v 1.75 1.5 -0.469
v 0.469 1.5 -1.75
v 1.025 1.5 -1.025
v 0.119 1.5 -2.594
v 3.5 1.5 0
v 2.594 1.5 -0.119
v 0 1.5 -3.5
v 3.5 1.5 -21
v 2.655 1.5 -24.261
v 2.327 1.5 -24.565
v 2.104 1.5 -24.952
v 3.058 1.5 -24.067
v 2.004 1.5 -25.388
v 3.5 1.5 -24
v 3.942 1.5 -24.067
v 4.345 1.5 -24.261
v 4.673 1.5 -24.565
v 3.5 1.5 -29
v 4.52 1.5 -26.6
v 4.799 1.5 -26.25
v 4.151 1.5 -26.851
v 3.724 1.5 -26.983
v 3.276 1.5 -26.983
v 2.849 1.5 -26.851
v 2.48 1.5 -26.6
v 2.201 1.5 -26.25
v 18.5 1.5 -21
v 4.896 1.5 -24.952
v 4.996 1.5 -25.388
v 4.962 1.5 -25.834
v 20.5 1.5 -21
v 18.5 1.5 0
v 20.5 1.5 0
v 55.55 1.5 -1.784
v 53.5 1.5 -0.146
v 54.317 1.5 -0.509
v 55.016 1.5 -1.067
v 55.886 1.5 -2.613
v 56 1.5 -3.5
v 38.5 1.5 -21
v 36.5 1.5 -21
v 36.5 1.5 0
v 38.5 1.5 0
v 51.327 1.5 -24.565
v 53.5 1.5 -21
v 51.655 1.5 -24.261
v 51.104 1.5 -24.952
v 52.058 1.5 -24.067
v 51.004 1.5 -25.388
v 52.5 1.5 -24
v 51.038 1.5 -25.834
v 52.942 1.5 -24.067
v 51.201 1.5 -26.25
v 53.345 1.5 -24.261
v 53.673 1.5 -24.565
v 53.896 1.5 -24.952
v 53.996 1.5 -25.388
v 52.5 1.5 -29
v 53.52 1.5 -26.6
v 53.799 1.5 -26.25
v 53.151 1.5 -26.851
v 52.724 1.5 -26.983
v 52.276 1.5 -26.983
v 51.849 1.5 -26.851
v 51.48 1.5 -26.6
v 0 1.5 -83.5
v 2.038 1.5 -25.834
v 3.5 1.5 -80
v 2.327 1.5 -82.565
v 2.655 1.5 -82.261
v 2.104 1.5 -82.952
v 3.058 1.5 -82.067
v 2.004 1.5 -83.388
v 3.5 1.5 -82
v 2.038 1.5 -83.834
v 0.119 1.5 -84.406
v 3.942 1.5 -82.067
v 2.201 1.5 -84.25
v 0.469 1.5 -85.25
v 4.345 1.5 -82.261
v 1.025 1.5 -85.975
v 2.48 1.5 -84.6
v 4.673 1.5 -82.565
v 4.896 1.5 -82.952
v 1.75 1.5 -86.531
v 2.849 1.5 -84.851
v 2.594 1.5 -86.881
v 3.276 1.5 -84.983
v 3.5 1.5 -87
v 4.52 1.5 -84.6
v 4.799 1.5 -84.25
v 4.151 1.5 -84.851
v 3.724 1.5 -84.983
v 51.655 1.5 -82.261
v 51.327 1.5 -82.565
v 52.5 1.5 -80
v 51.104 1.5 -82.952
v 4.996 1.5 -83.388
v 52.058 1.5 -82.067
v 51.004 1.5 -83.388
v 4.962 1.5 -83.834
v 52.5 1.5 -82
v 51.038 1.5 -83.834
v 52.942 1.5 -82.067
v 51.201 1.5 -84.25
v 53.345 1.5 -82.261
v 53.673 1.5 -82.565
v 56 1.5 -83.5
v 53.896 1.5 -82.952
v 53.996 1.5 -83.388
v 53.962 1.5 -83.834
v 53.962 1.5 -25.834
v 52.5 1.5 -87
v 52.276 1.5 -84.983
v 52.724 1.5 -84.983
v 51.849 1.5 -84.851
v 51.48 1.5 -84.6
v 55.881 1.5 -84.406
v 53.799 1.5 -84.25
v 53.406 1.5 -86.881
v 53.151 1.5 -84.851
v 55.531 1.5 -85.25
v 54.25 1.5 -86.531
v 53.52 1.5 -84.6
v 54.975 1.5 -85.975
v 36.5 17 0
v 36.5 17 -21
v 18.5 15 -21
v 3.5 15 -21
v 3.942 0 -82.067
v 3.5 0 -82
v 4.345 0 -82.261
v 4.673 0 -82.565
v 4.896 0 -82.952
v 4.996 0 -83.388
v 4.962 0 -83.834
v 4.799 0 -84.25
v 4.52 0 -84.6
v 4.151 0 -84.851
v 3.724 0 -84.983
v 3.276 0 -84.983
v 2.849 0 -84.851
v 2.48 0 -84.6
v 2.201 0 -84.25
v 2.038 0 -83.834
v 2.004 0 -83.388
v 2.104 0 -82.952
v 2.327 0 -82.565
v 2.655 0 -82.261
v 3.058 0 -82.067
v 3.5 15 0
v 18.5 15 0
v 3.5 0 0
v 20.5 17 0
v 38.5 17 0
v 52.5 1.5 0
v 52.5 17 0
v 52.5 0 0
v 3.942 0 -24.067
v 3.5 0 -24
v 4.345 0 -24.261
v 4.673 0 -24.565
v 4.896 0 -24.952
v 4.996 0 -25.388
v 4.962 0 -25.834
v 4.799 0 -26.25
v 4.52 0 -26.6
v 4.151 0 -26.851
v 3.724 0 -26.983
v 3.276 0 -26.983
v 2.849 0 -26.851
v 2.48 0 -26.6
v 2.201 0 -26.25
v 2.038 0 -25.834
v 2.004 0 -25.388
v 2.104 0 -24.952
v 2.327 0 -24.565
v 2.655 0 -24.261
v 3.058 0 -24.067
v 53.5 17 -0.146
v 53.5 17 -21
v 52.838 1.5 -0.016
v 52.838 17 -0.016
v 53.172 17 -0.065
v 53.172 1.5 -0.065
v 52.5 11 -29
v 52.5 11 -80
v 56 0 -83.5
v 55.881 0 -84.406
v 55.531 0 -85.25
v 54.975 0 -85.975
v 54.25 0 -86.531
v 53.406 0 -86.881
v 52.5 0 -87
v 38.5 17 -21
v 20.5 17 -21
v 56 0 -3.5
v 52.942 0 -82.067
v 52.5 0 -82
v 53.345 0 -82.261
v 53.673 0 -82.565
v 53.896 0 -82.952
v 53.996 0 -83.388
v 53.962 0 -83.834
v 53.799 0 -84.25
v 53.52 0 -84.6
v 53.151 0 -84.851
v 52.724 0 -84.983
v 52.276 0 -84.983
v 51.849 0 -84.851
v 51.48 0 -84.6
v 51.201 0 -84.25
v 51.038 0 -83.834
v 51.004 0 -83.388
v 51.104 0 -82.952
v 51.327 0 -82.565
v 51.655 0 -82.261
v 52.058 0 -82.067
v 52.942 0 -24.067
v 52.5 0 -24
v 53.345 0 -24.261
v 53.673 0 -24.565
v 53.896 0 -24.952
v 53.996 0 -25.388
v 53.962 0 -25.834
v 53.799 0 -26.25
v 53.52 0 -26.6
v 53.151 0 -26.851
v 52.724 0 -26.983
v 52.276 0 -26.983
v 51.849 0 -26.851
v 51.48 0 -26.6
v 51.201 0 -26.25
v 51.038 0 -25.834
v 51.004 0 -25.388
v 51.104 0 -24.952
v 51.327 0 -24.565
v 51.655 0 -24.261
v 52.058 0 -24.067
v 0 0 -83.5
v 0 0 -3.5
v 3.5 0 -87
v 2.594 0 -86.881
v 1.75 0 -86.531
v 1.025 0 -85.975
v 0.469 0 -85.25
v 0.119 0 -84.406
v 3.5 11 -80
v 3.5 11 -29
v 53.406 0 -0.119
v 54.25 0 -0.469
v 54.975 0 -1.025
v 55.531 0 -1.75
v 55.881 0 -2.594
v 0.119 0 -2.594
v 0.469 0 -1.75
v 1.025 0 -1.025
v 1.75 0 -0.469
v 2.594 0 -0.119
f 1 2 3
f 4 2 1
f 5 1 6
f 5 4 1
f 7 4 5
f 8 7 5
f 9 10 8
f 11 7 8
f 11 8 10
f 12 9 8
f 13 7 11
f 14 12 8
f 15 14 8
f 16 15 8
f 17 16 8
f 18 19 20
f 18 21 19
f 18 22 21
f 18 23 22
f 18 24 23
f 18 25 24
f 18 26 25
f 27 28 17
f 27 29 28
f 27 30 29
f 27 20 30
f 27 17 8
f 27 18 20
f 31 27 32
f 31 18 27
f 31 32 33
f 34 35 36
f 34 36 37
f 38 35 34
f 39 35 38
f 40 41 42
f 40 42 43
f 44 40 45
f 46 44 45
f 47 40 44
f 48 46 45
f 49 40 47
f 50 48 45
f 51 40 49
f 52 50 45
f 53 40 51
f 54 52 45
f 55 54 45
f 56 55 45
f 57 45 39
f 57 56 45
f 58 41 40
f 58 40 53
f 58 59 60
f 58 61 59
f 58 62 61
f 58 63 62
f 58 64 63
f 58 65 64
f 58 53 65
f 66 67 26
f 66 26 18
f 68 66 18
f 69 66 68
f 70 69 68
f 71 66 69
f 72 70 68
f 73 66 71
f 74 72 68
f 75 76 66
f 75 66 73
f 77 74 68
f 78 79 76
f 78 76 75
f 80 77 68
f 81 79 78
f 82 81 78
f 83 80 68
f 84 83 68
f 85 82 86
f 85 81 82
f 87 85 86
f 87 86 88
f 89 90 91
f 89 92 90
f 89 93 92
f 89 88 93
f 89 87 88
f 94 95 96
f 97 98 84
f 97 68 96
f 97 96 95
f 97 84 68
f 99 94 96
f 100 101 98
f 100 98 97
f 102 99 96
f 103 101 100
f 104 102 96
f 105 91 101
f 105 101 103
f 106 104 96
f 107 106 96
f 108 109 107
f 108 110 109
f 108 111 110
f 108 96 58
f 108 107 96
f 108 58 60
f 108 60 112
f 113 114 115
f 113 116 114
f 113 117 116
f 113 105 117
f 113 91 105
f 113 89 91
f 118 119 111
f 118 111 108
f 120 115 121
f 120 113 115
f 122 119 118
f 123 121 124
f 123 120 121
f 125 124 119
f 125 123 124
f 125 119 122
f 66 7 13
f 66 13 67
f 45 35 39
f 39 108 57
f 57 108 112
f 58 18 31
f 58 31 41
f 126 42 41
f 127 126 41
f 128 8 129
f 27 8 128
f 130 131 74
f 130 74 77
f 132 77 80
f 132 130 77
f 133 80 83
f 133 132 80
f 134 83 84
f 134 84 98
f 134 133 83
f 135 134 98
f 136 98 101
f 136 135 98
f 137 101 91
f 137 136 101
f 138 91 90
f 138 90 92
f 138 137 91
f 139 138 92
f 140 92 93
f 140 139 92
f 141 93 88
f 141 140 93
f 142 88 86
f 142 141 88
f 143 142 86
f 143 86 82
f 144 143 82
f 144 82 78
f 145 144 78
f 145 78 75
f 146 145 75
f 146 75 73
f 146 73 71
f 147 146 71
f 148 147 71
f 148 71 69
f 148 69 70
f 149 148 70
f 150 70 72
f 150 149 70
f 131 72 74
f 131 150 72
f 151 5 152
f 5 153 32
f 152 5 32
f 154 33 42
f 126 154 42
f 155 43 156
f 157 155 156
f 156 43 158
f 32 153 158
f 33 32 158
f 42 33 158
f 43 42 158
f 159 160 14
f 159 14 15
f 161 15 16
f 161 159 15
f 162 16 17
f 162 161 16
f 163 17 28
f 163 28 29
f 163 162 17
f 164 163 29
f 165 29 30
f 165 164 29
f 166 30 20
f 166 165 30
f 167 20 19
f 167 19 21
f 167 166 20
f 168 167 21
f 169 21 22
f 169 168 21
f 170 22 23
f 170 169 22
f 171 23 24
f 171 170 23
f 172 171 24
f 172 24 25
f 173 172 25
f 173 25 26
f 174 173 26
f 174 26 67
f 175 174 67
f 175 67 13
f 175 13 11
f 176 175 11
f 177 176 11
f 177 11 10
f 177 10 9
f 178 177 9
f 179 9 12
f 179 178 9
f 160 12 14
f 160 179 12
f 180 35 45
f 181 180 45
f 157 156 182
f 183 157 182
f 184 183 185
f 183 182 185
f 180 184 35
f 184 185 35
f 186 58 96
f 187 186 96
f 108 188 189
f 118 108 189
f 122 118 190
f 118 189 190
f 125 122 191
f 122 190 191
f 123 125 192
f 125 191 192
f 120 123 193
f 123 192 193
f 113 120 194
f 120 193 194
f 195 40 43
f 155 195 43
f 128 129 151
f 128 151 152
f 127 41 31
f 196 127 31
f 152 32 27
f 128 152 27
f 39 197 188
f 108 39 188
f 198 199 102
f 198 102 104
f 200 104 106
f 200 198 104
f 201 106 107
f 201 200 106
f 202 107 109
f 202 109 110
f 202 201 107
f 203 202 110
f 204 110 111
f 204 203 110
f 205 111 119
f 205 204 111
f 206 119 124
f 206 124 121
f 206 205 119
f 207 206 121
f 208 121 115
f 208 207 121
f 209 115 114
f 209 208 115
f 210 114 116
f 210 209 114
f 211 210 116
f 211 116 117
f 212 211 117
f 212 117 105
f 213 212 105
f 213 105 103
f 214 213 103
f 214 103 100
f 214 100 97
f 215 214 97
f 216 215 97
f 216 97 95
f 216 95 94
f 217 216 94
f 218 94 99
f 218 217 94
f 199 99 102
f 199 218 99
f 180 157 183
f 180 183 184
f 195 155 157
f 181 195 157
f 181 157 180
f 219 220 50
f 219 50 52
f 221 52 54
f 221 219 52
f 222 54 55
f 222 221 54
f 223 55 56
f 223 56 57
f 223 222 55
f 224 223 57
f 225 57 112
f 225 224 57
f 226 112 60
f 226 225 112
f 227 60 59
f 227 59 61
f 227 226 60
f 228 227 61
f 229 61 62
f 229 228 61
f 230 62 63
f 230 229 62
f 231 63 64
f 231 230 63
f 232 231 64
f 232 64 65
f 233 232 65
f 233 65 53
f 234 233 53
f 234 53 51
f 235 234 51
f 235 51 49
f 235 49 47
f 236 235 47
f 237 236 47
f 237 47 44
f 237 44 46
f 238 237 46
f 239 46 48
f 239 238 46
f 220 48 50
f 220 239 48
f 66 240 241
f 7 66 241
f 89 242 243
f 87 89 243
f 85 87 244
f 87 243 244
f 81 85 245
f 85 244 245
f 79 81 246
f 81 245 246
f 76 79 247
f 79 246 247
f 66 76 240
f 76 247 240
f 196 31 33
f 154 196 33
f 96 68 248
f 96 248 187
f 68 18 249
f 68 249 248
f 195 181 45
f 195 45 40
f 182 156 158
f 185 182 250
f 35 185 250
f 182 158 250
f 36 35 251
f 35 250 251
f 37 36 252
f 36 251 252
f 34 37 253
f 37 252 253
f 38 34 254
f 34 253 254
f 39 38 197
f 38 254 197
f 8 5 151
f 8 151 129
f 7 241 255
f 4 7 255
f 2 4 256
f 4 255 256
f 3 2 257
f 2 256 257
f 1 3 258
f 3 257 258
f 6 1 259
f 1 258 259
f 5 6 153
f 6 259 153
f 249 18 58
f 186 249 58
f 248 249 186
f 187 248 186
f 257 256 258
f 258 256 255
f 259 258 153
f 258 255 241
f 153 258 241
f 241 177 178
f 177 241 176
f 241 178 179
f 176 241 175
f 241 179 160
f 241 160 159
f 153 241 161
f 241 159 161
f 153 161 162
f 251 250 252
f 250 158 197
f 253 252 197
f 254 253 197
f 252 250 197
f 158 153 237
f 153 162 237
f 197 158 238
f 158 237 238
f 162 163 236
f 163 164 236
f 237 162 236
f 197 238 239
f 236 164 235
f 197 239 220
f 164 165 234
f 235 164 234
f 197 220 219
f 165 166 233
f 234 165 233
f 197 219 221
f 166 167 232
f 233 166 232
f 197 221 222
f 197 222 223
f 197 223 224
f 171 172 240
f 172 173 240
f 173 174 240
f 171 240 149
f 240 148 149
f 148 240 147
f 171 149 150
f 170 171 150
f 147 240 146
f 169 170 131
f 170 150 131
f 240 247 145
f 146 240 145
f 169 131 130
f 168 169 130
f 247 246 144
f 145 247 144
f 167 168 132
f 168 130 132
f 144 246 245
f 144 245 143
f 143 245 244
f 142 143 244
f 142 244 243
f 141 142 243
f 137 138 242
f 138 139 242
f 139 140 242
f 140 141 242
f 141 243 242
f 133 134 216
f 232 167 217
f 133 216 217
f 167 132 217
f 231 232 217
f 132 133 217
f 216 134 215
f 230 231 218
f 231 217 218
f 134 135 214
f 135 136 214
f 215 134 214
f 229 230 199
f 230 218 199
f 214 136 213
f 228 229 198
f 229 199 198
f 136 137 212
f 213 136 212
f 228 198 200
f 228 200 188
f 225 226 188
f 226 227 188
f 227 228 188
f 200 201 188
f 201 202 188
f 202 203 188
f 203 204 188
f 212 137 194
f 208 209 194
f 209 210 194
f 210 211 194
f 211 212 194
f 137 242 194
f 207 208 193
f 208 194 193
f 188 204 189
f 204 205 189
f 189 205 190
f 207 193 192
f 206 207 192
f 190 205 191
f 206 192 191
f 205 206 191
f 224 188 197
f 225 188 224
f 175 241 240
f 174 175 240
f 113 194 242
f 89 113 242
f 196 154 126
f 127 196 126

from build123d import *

# Parameters (mm, degrees)
SKETCH_1_R      = 1.5
EXTRUDE_1_DEPTH = 1.5
EXTRUDE_2_DEPTH = 15.5
SKETCH_3_W      = 49
SKETCH_3_H      = 51
EXTRUDE_3_DEPTH = 9.5
SKETCH_4_W      = 15
SKETCH_4_H      = 21
EXTRUDE_4_DEPTH = 13.5


with BuildPart() as part:
    # Эскиз1 → Бобышка-Вытянуть1 (new body)
    with BuildSketch(Plane(origin=(0, 0, 0), x_dir=(1, 0, 0), z_dir=(0, 1, 0))):
        with BuildLine():
            Line((3.5, 0), (52.5, 0))
            ThreePointArc((52.5, 0), (54.974873734, 1.025126266), (56, 3.5))
            Line((56, 3.5), (56, 83.5))
            ThreePointArc((56, 83.5), (54.974873734, 85.974873734), (52.5, 87))
            Line((52.5, 87), (3.5, 87))
            ThreePointArc((3.5, 87), (1.025126266, 85.974873734), (0, 83.5))
            Line((0, 83.5), (0, 3.5))
            ThreePointArc((0, 3.5), (1.025126266, 1.025126266), (3.5, 0))
        make_face()
        with Locations(Location((3.5, 83.5, 0), (0, 0, 270))):
            Circle(SKETCH_1_R, mode=Mode.SUBTRACT)
        with Locations(Location((52.5, 83.5, 0), (0, 0, 270))):
            Circle(SKETCH_1_R, mode=Mode.SUBTRACT)
        with Locations(Location((52.5, 25.5, 0), (0, 0, 270))):
            Circle(SKETCH_1_R, mode=Mode.SUBTRACT)
        with Locations(Location((3.5, 25.5, 0), (0, 0, 270))):
            Circle(SKETCH_1_R, mode=Mode.SUBTRACT)
    extrude(amount=EXTRUDE_1_DEPTH)

    # Эскиз2 → Бобышка-Вытянуть2 (add)
    with BuildSketch(Plane(origin=(0, 1.5, 0), x_dir=(1, 0, 0), z_dir=(0, 1, 0))):
        Polygon((20.5, 0), (28, 0), (36.5, 0), (36.5, 21), (20.5, 21), align=None)
        with BuildLine():
            Line((38.5, 21), (38.5, 0))
            Line((38.5, 0), (52.5, 0))
            ThreePointArc((52.5, 0), (53.005293538, 0.036666571), (53.5, 0.145898034))
            Line((53.5, 0.145898034), (53.5, 21))
            Line((53.5, 21), (38.5, 21))
        make_face()
    extrude(amount=EXTRUDE_2_DEPTH)

    # Эскиз3 → Бобышка-Вытянуть3 (add)
    with BuildSketch(Plane(origin=(0, 1.5, 0), x_dir=(1, 0, 0), z_dir=(0, 1, 0))):
        with Locations((28, 54.5)):
            Rectangle(SKETCH_3_W, SKETCH_3_H)
    extrude(amount=EXTRUDE_3_DEPTH)

    # Эскиз4 → Бобышка-Вытянуть4 (add)
    with BuildSketch(Plane(origin=(0, 1.5, 0), x_dir=(1, 0, 0), z_dir=(0, 1, 0))):
        with Locations((11, 10.5)):
            Rectangle(SKETCH_4_W, SKETCH_4_H)
    extrude(amount=EXTRUDE_4_DEPTH)


solid = part.part
